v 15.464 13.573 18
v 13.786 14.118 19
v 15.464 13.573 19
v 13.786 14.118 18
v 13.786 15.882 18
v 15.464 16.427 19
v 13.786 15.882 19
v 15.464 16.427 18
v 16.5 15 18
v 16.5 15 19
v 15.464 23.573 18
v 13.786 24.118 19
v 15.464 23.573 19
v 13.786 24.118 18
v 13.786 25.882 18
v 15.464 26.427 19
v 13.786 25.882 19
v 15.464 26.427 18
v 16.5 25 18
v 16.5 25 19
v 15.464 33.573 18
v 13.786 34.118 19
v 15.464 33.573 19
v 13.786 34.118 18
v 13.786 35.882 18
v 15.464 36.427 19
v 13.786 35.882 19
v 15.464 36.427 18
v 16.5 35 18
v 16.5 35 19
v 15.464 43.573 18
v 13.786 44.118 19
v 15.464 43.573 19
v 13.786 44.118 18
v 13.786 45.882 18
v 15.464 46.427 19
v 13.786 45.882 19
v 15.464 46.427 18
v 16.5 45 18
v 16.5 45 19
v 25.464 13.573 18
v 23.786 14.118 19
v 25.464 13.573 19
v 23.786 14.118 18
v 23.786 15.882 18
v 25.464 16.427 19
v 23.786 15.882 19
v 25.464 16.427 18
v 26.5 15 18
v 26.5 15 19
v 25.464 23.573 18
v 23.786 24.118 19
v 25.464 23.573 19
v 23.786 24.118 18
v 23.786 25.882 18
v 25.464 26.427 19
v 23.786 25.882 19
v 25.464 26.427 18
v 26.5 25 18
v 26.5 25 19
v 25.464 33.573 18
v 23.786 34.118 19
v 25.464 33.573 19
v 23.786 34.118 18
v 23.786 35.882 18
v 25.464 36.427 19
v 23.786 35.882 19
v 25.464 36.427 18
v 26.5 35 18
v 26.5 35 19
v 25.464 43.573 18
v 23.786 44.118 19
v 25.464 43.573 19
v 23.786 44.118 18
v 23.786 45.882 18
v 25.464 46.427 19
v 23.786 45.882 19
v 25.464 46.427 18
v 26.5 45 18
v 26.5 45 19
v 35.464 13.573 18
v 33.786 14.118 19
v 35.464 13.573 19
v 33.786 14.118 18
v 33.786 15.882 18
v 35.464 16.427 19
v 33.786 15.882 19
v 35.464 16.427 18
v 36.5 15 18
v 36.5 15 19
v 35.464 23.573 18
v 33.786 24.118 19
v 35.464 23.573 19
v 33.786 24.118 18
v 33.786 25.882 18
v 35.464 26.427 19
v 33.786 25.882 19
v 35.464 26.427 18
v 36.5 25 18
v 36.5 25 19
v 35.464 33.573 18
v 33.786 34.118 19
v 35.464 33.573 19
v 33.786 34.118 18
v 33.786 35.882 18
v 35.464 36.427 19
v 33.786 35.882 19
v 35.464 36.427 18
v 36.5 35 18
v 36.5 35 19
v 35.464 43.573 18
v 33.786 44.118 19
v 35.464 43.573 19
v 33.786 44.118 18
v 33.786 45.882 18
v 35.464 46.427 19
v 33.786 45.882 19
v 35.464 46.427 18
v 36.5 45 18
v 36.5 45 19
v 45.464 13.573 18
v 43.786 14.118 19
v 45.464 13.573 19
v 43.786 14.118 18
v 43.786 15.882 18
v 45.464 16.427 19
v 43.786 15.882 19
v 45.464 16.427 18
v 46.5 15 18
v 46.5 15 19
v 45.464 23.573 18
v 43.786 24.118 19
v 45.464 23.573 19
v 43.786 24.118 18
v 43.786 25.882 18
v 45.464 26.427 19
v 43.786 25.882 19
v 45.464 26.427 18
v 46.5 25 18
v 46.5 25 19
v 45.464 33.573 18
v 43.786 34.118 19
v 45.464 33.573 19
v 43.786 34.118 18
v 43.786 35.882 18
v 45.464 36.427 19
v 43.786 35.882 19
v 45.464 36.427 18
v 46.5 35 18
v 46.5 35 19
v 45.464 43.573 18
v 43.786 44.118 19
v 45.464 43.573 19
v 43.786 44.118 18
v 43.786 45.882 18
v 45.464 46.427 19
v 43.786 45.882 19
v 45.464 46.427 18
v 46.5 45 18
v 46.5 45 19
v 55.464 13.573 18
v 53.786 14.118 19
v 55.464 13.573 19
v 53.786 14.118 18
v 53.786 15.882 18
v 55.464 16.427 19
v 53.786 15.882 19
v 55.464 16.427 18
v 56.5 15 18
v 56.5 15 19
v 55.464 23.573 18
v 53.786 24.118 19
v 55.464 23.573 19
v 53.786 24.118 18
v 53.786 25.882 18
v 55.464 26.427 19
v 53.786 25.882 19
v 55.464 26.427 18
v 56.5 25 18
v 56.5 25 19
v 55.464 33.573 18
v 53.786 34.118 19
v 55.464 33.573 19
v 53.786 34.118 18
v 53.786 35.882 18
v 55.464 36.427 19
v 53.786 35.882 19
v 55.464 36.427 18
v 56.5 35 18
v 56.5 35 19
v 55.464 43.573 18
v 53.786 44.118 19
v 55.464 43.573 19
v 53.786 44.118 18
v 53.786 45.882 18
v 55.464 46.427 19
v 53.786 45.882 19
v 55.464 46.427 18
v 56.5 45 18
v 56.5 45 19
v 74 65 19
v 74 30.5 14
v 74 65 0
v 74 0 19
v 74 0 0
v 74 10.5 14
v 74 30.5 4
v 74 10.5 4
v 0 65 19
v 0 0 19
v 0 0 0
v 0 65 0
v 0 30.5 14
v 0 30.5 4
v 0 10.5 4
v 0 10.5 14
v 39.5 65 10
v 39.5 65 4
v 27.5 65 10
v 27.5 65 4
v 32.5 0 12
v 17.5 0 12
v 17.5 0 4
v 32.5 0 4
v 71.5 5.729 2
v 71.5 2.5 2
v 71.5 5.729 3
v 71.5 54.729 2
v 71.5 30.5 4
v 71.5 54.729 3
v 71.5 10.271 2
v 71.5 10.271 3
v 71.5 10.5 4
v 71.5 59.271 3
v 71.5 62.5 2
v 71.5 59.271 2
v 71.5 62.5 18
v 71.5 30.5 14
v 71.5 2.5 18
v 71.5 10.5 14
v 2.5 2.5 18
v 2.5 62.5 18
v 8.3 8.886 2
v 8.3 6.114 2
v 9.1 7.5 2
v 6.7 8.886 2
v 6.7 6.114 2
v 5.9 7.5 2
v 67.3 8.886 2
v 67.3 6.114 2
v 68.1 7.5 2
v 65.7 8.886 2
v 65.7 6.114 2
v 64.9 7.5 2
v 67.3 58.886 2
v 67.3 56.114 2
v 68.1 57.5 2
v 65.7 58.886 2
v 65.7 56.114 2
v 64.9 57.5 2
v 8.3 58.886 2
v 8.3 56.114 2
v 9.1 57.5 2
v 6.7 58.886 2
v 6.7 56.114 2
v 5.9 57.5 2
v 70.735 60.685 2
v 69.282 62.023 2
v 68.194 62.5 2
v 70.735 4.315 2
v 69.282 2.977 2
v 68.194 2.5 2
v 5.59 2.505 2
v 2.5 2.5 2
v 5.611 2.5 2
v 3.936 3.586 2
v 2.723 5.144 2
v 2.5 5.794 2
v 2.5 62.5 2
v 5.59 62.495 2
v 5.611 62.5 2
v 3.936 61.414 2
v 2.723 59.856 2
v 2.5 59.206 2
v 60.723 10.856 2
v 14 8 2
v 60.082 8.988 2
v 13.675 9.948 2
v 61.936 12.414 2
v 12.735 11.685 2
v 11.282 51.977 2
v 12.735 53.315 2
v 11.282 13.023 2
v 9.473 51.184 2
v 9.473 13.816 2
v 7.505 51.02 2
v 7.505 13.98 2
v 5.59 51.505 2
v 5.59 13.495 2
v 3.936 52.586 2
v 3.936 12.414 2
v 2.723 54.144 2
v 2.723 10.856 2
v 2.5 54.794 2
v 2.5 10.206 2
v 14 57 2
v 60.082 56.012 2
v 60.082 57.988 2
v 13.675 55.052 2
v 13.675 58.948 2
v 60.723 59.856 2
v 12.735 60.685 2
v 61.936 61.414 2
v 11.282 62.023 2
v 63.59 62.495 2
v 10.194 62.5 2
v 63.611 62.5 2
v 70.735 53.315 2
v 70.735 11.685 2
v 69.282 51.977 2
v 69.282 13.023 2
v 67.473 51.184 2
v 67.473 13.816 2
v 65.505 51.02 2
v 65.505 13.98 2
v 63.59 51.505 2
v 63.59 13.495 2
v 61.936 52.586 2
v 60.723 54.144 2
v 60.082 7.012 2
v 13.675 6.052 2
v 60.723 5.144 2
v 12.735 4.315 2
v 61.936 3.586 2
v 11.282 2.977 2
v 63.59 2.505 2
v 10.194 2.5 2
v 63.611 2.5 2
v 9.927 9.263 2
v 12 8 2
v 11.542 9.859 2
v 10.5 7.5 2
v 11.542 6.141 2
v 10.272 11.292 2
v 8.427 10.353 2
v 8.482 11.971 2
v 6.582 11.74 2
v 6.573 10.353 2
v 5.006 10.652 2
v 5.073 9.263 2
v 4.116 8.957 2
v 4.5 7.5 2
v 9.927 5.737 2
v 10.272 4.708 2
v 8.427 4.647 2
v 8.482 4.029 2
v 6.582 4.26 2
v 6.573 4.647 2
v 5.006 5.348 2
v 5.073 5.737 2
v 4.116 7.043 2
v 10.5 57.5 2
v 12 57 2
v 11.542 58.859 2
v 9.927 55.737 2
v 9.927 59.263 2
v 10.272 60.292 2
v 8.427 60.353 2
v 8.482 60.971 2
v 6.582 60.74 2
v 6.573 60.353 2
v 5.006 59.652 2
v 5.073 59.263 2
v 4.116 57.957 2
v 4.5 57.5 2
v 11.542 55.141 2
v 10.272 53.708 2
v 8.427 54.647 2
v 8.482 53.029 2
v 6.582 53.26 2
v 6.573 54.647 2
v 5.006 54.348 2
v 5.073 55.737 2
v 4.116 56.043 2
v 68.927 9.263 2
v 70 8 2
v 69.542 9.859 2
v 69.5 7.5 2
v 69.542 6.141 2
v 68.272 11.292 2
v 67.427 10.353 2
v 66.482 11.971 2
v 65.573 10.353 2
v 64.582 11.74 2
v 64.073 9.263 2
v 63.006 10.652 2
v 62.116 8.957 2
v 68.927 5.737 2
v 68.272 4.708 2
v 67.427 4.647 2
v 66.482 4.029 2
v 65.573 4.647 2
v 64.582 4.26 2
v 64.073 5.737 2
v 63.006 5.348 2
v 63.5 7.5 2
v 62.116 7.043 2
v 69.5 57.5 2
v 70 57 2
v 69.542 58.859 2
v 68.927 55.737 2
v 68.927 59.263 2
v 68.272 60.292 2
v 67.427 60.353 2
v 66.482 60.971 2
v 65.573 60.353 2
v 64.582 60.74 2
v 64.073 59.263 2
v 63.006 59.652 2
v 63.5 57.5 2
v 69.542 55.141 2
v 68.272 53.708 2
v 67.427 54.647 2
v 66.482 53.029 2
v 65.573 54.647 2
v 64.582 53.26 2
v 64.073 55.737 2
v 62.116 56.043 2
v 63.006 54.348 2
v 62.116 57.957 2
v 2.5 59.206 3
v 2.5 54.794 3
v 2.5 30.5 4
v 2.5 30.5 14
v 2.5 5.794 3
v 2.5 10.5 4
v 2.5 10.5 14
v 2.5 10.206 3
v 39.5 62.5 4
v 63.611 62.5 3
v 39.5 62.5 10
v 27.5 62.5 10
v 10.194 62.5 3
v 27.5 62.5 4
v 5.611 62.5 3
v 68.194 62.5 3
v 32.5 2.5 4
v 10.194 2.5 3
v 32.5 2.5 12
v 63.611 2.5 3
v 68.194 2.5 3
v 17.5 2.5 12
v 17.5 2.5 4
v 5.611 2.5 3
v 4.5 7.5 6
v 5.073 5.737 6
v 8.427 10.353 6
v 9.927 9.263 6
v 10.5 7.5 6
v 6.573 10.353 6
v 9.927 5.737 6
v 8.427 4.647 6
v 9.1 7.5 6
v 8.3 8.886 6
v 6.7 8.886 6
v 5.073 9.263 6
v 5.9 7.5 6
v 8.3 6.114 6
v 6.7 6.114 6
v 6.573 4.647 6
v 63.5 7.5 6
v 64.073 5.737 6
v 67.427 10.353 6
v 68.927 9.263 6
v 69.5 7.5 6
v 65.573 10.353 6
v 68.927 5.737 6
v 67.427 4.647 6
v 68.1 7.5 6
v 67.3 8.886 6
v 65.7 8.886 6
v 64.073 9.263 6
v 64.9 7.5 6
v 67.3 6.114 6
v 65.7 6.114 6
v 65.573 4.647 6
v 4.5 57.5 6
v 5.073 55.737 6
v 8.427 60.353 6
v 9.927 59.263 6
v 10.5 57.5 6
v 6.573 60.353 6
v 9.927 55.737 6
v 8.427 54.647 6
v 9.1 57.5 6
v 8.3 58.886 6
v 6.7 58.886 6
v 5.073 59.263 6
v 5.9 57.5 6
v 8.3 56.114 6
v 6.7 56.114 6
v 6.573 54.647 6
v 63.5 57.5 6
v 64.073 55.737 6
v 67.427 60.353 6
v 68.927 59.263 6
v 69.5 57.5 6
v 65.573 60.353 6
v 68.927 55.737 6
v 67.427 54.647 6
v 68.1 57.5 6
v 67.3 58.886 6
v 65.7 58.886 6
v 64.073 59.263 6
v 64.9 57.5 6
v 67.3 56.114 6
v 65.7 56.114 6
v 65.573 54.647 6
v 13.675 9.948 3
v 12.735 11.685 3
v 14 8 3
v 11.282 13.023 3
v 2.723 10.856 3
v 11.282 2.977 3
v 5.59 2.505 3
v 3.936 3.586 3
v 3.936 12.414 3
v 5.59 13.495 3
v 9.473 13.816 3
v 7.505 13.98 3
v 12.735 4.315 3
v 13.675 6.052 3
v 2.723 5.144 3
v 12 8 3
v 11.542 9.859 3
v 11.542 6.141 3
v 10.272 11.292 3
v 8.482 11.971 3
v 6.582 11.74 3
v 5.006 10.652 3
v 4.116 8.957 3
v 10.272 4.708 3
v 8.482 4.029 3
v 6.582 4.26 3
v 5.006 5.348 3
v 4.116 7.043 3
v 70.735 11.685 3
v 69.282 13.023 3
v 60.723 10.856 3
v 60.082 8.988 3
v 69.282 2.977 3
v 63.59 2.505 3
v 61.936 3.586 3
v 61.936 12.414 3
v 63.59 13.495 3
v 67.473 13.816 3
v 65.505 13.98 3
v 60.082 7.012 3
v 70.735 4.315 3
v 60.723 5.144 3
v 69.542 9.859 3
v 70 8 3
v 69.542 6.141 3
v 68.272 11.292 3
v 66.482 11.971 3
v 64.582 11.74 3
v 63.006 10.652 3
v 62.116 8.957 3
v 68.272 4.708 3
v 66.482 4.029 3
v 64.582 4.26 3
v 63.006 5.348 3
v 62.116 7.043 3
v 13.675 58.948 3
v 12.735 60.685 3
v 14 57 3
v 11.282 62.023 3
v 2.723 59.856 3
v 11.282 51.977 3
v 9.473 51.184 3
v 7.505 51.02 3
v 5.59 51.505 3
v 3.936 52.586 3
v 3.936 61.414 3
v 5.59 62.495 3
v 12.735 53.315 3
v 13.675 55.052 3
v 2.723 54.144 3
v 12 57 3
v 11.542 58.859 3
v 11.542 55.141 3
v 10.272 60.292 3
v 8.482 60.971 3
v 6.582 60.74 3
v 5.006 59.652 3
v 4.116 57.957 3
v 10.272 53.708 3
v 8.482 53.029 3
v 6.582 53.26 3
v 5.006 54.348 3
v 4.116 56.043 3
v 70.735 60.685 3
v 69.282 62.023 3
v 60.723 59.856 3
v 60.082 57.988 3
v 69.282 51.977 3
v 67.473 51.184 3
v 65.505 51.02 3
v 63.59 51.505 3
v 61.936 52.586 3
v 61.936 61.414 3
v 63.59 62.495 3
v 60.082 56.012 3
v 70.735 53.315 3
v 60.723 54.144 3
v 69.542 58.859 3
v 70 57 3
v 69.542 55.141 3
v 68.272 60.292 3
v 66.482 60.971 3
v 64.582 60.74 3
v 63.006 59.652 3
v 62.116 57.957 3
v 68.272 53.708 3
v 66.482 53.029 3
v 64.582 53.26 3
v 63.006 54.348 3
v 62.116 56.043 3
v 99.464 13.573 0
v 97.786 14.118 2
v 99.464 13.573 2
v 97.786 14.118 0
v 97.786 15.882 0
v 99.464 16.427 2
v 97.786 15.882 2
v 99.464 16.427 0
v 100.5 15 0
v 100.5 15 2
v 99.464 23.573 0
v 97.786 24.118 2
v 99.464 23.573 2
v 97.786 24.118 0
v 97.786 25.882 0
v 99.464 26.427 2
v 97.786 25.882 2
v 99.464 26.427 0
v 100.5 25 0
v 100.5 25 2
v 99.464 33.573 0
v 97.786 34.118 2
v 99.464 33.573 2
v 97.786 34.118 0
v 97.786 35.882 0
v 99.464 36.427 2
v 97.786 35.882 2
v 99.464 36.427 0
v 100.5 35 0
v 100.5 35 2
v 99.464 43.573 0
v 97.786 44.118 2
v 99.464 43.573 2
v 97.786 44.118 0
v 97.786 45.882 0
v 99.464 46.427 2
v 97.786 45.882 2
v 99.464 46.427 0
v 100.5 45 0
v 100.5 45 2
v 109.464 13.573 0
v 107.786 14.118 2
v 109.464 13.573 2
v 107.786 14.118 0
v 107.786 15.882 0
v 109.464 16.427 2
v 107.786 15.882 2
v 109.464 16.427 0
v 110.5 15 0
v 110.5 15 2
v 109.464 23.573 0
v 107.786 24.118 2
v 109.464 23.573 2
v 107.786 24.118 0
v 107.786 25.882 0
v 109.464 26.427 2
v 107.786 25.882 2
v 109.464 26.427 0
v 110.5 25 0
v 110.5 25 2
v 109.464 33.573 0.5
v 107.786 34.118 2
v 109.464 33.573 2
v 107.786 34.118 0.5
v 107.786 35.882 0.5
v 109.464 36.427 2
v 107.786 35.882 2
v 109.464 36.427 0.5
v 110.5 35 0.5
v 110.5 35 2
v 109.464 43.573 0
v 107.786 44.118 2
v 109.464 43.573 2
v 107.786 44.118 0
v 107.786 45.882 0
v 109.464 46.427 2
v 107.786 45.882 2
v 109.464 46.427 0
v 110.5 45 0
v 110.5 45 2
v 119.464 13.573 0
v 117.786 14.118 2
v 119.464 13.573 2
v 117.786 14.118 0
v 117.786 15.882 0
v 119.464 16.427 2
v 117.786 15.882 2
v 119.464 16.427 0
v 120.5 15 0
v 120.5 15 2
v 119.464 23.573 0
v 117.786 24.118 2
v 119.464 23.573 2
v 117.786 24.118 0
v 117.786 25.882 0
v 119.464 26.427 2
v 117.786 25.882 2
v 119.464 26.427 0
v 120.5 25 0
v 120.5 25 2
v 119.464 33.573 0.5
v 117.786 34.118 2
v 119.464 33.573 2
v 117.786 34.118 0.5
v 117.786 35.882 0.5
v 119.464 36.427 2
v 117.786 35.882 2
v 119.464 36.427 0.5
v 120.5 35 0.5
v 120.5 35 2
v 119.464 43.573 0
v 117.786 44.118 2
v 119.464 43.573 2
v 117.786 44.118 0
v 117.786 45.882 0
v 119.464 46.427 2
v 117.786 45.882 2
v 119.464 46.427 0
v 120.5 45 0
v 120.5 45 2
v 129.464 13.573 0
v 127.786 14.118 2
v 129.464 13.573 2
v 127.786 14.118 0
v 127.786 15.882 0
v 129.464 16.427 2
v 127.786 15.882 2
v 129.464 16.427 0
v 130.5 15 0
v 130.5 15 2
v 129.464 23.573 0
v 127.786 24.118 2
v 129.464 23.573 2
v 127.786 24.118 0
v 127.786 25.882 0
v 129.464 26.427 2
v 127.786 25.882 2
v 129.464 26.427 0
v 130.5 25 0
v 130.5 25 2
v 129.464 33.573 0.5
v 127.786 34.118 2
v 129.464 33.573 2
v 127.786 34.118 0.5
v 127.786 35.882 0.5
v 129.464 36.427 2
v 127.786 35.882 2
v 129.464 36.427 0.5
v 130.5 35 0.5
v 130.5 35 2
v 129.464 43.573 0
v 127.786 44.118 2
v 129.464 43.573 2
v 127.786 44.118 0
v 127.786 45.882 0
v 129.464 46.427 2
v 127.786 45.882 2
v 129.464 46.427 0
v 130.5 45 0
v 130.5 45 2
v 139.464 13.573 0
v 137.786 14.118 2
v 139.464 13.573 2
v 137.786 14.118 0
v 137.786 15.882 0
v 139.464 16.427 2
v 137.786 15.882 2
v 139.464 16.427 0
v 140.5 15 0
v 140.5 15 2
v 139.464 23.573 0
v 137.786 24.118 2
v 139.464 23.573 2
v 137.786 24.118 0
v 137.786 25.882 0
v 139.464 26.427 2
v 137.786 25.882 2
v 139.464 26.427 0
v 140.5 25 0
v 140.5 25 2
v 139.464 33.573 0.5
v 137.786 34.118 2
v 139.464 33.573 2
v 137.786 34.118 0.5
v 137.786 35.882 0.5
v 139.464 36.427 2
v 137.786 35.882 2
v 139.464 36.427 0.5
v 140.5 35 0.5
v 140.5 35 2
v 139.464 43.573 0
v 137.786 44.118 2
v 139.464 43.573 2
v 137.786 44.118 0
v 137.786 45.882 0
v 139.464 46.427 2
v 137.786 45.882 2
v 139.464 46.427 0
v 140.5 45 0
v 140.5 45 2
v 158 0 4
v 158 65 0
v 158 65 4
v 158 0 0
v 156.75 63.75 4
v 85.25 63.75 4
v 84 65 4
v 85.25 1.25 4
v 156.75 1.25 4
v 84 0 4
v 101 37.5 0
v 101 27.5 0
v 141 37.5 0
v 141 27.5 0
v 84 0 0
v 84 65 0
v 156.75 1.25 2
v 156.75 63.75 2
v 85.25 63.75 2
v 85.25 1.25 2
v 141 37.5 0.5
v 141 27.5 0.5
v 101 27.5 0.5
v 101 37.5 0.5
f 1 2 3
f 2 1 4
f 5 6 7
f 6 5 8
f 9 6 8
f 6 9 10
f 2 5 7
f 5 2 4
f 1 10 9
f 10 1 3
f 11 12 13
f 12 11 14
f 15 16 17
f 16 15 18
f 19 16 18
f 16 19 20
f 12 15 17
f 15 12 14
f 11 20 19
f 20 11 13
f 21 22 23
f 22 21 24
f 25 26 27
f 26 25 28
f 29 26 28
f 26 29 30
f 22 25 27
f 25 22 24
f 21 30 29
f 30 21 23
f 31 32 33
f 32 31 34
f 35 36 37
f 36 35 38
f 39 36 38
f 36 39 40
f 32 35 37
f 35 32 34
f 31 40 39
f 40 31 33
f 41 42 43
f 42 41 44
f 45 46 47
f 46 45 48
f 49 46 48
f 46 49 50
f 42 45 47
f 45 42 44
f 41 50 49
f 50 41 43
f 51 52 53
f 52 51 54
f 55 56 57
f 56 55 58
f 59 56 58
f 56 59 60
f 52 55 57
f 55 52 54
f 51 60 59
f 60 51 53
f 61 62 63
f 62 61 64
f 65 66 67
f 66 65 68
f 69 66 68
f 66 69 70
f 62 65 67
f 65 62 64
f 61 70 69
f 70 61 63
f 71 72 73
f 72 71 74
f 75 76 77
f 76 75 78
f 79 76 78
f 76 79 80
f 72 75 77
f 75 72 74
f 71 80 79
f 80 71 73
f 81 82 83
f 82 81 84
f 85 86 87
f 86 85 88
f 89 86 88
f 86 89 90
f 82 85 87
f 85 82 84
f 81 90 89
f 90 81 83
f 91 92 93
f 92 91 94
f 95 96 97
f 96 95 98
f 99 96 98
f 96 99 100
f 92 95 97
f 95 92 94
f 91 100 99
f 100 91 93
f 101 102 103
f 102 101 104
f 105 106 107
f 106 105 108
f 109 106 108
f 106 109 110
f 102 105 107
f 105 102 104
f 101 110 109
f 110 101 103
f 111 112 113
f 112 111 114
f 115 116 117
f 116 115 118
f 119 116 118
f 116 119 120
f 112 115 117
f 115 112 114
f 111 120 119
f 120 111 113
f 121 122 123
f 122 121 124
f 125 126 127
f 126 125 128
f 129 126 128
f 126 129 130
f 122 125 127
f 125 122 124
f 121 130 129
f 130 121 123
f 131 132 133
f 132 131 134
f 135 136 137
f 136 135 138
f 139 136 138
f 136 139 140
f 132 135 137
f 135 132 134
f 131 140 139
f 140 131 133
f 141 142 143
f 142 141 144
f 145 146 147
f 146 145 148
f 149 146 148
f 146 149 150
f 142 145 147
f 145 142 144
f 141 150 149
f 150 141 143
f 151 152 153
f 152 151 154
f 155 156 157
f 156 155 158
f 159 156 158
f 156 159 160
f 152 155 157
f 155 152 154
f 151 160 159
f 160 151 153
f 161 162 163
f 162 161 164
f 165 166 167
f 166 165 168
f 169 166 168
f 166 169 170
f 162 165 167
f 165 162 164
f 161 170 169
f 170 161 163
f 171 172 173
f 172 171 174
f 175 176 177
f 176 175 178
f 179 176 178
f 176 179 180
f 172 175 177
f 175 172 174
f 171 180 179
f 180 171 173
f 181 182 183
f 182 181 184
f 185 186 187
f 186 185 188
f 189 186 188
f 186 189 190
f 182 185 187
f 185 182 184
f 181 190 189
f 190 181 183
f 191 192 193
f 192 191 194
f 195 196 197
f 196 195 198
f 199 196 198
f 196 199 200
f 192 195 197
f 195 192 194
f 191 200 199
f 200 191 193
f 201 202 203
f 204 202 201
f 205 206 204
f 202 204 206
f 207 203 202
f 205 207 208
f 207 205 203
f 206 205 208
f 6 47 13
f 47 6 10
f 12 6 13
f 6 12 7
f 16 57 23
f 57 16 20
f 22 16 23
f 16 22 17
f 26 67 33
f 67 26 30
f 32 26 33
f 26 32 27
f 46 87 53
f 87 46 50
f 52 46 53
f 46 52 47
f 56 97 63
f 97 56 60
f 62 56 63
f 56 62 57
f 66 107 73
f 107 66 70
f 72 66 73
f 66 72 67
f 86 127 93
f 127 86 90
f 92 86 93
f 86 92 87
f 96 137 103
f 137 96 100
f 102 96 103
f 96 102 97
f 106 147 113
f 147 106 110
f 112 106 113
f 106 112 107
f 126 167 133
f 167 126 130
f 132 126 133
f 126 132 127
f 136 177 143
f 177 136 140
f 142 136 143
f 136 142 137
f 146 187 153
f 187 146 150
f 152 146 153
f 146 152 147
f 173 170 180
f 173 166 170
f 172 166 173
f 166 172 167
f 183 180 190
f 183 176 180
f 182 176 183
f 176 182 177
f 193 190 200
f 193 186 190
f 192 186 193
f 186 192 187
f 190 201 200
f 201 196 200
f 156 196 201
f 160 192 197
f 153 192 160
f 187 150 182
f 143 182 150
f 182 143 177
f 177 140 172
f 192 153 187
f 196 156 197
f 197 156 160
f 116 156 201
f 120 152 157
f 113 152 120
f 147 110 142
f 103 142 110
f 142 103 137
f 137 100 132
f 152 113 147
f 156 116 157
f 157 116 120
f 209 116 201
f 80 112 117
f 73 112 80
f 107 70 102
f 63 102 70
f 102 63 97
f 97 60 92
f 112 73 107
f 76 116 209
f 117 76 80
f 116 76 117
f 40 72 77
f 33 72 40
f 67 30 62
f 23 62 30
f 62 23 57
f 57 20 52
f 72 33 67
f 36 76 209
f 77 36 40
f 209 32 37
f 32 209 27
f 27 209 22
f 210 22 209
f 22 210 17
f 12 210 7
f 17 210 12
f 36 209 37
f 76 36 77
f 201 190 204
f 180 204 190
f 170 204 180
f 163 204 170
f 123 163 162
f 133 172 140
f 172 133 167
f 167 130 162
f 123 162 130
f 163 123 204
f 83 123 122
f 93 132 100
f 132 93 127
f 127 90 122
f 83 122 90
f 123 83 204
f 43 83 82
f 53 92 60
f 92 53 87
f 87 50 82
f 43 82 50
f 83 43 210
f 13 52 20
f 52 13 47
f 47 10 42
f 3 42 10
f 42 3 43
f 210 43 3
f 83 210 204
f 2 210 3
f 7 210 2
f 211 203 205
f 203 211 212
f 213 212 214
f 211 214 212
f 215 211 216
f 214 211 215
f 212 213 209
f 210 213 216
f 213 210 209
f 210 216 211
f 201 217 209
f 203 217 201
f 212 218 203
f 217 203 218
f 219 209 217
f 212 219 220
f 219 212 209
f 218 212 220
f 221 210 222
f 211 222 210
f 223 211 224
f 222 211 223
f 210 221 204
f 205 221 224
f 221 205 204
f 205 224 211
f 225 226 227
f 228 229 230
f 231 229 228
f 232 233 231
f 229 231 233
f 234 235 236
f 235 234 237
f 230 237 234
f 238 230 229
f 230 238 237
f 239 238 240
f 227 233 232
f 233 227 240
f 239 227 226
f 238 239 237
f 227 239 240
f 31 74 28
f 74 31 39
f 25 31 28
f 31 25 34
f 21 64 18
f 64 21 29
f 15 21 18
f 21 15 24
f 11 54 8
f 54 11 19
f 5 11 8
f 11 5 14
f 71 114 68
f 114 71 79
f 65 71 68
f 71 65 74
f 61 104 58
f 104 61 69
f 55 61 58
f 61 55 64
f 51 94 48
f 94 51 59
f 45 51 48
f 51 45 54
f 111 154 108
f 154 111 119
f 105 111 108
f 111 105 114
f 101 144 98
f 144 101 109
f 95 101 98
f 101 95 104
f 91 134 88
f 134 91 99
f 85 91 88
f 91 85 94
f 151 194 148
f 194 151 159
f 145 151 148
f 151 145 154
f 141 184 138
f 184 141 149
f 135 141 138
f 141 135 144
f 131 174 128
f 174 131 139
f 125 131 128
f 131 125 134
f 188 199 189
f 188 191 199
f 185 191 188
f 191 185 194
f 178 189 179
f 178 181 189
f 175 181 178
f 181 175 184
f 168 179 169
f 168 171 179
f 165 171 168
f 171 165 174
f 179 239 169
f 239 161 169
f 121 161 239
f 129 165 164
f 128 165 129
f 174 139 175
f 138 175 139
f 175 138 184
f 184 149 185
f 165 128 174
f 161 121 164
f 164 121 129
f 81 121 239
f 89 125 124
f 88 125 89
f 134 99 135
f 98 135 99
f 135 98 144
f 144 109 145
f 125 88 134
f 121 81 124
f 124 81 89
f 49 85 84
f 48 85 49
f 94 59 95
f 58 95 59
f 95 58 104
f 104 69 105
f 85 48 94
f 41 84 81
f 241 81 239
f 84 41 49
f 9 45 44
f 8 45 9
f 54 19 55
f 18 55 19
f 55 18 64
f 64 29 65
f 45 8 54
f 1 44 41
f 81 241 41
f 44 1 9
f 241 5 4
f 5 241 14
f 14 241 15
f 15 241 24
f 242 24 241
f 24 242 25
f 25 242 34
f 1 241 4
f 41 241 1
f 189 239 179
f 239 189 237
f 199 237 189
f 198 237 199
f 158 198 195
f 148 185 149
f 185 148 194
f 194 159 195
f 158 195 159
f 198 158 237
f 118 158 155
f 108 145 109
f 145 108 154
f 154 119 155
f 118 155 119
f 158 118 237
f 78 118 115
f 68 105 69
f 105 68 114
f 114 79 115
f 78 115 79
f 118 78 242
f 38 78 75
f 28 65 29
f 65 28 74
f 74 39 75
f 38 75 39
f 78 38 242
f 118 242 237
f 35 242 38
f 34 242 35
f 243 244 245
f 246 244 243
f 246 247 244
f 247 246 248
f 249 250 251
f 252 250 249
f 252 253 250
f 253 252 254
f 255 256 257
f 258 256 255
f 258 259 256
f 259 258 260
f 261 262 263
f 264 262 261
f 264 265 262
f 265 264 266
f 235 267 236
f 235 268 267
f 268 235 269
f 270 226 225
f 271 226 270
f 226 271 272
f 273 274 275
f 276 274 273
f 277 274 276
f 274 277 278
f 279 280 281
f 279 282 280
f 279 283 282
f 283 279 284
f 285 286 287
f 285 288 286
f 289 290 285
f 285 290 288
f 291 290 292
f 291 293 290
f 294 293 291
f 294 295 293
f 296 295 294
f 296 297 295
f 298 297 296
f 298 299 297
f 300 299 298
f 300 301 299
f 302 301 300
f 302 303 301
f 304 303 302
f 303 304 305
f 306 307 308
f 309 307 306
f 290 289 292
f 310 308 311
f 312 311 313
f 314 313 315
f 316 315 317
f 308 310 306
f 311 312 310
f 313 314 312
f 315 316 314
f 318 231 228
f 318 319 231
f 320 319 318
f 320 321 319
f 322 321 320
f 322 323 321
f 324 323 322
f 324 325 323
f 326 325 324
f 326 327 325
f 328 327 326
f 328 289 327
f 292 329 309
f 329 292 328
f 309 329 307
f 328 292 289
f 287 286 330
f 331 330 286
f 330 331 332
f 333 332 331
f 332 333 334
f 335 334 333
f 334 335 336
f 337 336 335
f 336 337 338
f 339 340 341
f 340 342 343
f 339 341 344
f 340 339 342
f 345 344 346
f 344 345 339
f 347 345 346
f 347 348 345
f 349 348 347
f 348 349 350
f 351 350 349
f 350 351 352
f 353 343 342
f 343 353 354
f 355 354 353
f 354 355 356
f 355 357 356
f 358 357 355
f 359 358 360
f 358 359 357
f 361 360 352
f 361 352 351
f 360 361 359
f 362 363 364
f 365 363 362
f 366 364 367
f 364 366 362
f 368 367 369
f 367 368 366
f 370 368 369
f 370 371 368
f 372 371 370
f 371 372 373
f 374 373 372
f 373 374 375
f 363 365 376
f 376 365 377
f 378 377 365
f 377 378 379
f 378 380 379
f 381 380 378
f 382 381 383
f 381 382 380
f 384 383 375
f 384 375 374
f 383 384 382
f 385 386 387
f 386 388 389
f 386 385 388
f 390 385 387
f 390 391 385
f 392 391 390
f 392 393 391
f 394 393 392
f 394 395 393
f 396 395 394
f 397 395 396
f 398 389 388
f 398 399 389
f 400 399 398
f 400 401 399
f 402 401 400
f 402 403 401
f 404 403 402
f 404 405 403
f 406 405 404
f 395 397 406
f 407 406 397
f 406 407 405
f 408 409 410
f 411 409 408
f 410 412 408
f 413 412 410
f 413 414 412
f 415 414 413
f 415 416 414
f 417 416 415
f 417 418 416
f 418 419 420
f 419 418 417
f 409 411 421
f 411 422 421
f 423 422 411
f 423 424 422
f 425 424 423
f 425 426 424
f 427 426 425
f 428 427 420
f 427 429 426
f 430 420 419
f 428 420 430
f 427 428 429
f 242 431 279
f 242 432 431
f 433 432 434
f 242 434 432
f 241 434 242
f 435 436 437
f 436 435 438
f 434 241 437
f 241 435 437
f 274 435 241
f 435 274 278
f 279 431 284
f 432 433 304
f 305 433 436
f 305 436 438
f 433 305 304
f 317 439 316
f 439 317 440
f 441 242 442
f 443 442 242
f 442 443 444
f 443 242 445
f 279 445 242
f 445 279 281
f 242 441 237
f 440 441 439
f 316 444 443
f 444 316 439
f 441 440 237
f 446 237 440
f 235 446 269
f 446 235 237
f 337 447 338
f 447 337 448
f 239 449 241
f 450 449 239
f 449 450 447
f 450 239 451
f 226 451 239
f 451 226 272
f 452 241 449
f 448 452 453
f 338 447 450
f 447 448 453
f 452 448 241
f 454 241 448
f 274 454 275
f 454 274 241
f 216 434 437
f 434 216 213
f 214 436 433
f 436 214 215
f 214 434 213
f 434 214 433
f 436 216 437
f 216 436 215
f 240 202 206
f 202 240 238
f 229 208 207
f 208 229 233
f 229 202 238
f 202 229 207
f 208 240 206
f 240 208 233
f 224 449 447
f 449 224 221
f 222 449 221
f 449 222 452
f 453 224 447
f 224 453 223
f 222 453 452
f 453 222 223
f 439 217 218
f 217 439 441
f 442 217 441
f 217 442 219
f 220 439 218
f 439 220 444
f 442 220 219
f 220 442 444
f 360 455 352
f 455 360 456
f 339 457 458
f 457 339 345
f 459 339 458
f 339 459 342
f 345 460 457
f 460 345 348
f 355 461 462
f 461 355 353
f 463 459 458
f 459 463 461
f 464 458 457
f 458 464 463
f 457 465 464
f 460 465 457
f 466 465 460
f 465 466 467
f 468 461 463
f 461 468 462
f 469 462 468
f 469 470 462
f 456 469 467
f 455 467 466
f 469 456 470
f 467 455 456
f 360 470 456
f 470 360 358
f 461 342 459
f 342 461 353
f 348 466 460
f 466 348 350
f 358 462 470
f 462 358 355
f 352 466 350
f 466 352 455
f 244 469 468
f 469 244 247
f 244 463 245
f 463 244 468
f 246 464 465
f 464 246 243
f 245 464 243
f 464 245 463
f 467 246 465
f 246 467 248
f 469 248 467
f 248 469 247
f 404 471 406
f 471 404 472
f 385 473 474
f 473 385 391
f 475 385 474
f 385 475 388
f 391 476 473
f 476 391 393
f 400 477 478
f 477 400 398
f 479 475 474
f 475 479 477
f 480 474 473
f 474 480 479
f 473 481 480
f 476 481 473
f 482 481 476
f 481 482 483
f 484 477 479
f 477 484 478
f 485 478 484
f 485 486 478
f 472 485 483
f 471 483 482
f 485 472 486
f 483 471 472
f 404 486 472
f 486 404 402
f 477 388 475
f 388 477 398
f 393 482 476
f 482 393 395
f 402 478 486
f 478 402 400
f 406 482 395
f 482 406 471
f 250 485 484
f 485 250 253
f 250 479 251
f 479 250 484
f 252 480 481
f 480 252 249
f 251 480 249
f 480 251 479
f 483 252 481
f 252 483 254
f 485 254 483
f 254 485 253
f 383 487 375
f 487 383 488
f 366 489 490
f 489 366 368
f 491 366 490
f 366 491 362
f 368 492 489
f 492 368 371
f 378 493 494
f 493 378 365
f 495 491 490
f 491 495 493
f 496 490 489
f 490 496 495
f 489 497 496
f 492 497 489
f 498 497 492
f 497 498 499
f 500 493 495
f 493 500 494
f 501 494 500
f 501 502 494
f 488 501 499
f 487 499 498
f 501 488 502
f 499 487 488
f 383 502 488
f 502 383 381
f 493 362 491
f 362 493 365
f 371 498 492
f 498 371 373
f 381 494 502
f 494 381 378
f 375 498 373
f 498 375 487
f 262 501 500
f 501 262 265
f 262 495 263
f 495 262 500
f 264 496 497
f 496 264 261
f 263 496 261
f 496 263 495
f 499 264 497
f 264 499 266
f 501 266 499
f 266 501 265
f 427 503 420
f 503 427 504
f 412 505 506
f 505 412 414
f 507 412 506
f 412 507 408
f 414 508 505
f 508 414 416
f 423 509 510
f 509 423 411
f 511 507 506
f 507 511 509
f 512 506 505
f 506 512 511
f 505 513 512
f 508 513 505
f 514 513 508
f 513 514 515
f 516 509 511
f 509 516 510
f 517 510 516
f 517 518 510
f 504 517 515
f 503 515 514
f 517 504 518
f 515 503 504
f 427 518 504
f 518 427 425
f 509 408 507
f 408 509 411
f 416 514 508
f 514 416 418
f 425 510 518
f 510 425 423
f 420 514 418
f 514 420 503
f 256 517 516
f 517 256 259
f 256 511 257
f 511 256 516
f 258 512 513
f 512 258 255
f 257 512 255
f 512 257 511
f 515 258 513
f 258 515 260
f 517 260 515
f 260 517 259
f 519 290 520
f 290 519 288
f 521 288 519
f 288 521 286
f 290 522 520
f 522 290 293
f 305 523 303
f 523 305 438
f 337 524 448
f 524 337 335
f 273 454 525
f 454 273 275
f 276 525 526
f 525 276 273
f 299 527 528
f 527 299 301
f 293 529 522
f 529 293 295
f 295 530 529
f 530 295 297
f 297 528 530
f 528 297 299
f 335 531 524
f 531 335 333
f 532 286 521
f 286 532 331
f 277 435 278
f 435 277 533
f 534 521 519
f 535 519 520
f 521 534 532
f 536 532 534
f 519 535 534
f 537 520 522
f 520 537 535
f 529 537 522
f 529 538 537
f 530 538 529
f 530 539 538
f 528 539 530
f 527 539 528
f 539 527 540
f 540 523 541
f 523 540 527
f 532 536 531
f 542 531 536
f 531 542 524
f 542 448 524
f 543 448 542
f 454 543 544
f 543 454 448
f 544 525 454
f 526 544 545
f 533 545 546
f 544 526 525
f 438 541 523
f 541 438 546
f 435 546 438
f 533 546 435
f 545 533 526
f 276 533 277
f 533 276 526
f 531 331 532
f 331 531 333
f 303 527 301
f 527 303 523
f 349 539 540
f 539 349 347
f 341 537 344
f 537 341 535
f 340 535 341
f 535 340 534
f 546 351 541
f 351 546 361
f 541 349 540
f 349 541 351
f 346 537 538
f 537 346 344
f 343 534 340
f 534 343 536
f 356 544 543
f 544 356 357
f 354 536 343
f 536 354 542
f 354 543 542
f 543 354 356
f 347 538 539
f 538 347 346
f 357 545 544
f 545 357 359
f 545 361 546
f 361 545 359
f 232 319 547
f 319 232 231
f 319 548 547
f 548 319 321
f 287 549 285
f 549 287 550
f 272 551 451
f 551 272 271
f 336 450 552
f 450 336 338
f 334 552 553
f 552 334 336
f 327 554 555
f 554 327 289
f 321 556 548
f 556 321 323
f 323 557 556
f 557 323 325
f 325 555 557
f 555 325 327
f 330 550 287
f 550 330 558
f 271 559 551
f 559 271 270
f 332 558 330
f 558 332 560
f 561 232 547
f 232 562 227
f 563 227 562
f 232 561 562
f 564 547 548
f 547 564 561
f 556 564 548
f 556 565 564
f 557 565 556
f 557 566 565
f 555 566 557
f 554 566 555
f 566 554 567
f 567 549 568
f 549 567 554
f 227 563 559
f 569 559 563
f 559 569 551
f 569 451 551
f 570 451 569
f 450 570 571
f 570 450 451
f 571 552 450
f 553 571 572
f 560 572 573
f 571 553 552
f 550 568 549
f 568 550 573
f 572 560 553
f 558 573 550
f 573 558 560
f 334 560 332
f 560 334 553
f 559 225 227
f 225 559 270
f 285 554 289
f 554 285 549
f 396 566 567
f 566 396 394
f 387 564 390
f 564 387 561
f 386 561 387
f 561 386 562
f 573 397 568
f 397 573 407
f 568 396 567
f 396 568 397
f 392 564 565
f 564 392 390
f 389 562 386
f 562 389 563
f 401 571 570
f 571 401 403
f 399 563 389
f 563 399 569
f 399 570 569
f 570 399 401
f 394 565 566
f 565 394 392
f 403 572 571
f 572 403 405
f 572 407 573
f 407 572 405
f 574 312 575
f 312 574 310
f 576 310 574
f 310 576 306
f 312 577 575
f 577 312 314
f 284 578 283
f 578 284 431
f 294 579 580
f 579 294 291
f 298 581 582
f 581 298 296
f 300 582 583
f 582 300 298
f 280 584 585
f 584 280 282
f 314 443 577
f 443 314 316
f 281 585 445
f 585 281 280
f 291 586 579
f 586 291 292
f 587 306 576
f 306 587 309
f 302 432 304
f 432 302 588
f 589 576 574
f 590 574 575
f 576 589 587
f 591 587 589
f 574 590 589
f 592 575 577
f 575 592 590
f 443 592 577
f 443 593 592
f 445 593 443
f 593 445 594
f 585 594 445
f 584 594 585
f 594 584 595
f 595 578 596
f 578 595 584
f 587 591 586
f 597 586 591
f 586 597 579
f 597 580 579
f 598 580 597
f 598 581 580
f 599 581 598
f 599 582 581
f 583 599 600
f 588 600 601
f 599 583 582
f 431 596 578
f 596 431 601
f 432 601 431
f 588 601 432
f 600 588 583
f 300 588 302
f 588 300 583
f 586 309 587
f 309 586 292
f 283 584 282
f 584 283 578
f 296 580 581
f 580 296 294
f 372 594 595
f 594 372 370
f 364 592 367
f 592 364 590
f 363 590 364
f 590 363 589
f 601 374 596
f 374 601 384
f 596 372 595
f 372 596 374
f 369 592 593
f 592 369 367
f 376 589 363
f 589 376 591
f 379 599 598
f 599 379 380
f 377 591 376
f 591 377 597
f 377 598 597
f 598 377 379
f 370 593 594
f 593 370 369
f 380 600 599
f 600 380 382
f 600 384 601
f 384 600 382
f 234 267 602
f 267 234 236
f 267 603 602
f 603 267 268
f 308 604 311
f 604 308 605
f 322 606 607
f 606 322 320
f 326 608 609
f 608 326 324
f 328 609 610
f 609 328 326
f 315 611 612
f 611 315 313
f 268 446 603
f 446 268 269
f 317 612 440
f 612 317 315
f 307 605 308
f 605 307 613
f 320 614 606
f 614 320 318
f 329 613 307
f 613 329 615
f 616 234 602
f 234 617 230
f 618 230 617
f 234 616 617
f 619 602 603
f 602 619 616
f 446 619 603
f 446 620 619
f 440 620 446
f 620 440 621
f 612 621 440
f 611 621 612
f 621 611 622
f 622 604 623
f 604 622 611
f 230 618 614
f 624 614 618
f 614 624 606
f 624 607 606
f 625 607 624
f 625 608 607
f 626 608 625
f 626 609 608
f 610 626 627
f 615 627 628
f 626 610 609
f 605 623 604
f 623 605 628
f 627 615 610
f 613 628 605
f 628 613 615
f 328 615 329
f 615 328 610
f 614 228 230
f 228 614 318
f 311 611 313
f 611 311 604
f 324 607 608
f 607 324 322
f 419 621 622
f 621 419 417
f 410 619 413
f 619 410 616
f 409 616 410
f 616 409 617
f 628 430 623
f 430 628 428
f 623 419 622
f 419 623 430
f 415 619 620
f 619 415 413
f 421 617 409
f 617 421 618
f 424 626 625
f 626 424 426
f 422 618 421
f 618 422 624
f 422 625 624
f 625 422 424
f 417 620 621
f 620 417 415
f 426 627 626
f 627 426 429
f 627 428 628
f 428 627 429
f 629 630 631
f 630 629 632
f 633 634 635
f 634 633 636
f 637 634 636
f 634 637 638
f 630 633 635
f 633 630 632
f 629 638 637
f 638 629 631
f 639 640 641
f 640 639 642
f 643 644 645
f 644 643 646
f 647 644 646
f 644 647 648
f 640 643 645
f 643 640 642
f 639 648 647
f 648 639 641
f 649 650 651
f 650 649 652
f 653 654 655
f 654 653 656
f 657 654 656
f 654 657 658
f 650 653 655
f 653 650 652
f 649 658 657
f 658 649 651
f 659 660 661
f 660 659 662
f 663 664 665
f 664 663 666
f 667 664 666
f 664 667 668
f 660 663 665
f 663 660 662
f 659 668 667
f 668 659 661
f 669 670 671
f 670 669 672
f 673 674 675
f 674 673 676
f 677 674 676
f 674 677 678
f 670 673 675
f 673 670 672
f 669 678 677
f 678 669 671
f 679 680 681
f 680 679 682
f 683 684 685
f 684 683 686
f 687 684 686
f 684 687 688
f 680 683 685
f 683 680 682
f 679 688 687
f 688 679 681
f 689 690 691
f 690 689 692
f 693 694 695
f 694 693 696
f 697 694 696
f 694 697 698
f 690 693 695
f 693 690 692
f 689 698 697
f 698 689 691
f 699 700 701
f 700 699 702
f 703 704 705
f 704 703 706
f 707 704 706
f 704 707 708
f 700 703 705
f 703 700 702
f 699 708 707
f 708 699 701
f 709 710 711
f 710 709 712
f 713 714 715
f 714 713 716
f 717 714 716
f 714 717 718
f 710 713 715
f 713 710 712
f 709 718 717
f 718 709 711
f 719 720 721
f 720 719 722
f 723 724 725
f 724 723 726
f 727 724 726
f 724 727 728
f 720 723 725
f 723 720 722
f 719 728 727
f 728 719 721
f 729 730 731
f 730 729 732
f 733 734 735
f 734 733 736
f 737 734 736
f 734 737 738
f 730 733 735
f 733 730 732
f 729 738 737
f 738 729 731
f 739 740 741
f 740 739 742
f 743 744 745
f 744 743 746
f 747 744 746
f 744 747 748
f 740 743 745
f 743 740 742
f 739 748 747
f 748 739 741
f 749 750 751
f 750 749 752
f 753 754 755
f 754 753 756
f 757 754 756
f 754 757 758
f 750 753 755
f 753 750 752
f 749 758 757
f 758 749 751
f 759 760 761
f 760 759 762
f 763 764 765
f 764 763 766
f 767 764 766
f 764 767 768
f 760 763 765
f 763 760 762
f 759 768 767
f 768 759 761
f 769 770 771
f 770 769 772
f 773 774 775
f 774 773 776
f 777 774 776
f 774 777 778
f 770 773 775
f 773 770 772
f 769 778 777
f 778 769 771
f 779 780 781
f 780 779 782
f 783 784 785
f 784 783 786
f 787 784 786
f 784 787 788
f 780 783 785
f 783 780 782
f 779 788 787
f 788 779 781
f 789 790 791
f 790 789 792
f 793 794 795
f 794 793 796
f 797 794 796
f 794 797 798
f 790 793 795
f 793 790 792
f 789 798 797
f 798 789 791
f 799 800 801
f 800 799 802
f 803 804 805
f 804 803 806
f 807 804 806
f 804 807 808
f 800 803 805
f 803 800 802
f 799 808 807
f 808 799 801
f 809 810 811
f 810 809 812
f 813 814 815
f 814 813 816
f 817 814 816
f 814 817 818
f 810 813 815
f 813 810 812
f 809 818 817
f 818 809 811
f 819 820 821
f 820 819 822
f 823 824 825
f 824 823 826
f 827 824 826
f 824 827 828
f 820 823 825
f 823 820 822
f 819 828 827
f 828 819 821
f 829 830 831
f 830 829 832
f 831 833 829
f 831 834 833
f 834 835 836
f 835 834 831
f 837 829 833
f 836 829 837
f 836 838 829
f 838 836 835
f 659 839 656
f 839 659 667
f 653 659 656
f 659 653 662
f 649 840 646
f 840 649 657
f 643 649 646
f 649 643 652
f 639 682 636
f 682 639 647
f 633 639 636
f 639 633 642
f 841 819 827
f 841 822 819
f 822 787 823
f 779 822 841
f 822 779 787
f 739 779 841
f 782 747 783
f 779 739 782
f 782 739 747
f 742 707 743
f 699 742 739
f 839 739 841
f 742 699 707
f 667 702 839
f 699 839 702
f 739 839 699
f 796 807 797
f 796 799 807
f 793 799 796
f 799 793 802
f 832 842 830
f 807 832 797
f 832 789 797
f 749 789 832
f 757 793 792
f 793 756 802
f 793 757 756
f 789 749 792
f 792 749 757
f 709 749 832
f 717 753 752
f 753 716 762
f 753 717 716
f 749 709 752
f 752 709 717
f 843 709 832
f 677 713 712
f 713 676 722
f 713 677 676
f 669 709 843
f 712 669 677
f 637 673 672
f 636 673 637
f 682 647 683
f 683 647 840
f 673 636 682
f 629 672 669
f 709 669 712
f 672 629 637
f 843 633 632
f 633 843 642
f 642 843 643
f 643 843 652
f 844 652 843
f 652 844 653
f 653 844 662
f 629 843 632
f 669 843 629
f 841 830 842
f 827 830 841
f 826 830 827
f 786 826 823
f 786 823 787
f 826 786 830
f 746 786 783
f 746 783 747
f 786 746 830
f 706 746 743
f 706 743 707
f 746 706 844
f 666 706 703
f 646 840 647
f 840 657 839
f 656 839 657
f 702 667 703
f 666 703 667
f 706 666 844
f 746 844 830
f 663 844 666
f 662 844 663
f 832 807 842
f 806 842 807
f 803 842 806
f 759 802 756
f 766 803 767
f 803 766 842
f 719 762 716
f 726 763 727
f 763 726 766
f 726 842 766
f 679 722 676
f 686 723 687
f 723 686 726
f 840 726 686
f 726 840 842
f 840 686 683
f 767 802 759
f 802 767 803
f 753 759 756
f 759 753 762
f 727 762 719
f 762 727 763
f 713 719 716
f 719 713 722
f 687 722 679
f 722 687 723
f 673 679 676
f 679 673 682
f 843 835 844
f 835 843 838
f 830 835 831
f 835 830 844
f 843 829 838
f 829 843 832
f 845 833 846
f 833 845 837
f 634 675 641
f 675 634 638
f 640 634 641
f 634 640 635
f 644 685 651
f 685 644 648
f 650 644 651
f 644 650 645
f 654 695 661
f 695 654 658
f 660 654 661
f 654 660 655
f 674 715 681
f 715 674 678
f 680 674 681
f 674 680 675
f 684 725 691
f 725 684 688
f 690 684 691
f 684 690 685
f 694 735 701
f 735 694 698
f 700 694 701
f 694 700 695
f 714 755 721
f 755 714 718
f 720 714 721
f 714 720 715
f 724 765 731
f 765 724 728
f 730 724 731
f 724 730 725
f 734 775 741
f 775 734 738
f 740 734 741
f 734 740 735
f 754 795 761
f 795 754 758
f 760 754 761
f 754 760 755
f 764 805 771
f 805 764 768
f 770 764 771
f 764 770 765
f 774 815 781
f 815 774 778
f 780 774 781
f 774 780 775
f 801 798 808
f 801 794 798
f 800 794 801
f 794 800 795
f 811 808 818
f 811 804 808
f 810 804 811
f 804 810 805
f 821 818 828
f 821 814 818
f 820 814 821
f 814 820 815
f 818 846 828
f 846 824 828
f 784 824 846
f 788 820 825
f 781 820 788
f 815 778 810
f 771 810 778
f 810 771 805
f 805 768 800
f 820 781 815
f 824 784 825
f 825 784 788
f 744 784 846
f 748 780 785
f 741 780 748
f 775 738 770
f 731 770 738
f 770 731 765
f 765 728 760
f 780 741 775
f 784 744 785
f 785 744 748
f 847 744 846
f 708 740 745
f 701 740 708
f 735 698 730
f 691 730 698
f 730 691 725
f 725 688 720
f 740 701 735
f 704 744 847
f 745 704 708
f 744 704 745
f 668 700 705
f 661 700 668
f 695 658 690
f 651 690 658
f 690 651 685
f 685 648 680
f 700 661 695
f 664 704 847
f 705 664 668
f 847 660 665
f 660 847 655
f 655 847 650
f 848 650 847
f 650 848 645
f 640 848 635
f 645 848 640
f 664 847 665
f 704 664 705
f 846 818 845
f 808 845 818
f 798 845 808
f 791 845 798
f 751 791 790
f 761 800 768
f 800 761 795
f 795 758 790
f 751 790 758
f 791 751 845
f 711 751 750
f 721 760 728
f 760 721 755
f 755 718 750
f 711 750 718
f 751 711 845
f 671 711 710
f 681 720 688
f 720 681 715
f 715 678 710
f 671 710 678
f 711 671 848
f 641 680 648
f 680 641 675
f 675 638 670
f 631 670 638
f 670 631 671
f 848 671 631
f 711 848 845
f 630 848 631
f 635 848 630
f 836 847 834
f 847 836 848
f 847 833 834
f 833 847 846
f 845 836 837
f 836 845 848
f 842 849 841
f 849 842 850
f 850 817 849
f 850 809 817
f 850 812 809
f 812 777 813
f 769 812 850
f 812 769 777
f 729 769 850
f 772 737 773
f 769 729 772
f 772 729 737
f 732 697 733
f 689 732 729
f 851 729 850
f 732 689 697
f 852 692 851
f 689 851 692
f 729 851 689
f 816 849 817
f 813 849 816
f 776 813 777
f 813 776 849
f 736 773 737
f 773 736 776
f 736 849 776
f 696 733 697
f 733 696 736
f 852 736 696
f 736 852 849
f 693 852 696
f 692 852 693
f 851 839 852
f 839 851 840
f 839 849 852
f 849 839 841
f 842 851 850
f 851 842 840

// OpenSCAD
// Motor Controller Case - 3D Printable
// Designed for dual H-bridge motor driver with 330µF capacitors
// Compatible with boards similar to L298N replacements

// Main dimensions (adjust based on your specific board)
board_length = 65;     // Board length in mm
board_width = 56;      // Board width in mm
board_thickness = 1.6; // PCB thickness in mm

// Case dimensions
case_wall = 2.5;       // Wall thickness
case_floor = 2;        // Bottom thickness
case_ceiling = 2;      // Top thickness
case_clearance = 3;    // Space above components

// Component heights (estimated)
capacitor_height = 12; // 330µF capacitor height
terminal_height = 8;   // Green terminal block height
chip_height = 4;       // IC height

// Calculate internal dimensions
internal_length = board_length + 4; // Small clearance around board
internal_width = board_width + 4;
internal_height = max(capacitor_height, terminal_height) + case_clearance;

// External case dimensions
external_length = internal_length + (case_wall * 2);
external_width = internal_width + (case_wall * 2);
external_height = internal_height + case_floor + case_ceiling;

// Mounting post dimensions
post_diameter = 6;
post_height = case_floor + 2;
screw_hole_diameter = 3.2; // M3 screw

// Terminal block cutout dimensions
terminal_width = 20;
terminal_depth = 12;

module main_case() {
    difference() {
        // Outer case
        cube([external_length, external_width, external_height]);
        
        // Internal cavity
        translate([case_wall, case_wall, case_floor]) {
            cube([internal_length, internal_width, internal_height + 1]);
        }
        
        // Terminal block cutouts (left side)
        translate([-1, case_wall + 8, case_floor + 2]) {
            cube([case_wall + 2, terminal_width, terminal_height + 2]);
        }
        
        // Terminal block cutouts (right side)
        translate([external_length - case_wall - 1, case_wall + 8, case_floor + 2]) {
            cube([case_wall + 2, terminal_width, terminal_height + 2]);
        }
        
        // Power input connector cutout (back)
        translate([case_wall + 15, -1, case_floor + 2]) {
            cube([15, case_wall + 2, 8]);
        }
        
        // Control signal connector cutout (front)
        translate([case_wall + 25, external_width - case_wall - 1, case_floor + 2]) {
            cube([12, case_wall + 2, 6]);
        }
        
        // Ventilation holes on top
        for(x = [15:10:external_length-15]) {
            for(y = [15:10:external_width-15]) {
                translate([x, y, external_height - case_ceiling]) {
                    cylinder(d=3, h=case_ceiling + 1);
                }
            }
        }
    }
    
    // Mounting posts for PCB
    translate([case_wall + 5, case_wall + 5, case_floor]) {
        mounting_post();
    }
    translate([case_wall + internal_length - 5, case_wall + 5, case_floor]) {
        mounting_post();
    }
    translate([case_wall + 5, case_wall + internal_width - 5, case_floor]) {
        mounting_post();
    }
    translate([case_wall + internal_length - 5, case_wall + internal_width - 5, case_floor]) {
        mounting_post();
    }
}

module mounting_post() {
    difference() {
        cylinder(d=post_diameter, h=post_height);
        cylinder(d=screw_hole_diameter, h=post_height + 1);
    }
}

module case_lid() {
    difference() {
        cube([external_length, external_width, case_ceiling + 2]);
        
        // Inner recess to fit on case
        translate([case_wall/2, case_wall/2, case_ceiling]) {
            cube([external_length - case_wall, external_width - case_wall, 3]);
        }
        
        // Ventilation holes
        for(x = [15:10:external_length-15]) {
            for(y = [15:10:external_width-15]) {
                translate([x, y, -1]) {
                    cylinder(d=3, h=case_ceiling + 4);
                }
            }
        }
        
        // Label recess
        translate([external_length/2 - 20, external_width/2 - 5, -0.5]) {
            cube([40, 10, 1]);
        }
    }
}

module case_bottom_with_feet() {
    union() {
        main_case();
        
        // Rubber feet positions
        translate([8, 8, 0]) {
            rubber_foot();
        }
        translate([external_length - 8, 8, 0]) {
            rubber_foot();
        }
        translate([8, external_width - 8, 0]) {
            rubber_foot();
        }
        translate([external_length - 8, external_width - 8, 0]) {
            rubber_foot();
        }
    }
}

module rubber_foot() {
    difference() {
        cylinder(d=12, h=3);
        translate([0, 0, 1]) {
            cylinder(d=8, h=3);
        }
    }
}

// Assembly view (comment out parts you don't want to print)
// Main case bottom
case_bottom_with_feet();

// Lid (translate for separate printing)
translate([external_length + 10, 0, 0]) {
    case_lid();
}

// Print settings information
echo("=== PRINT SETTINGS ===");
echo("Layer height: 0.2mm");
echo("Infill: 20%");
echo("Support: No support needed");
echo("Print orientation: As shown");
echo("");
echo("=== CASE DIMENSIONS ===");
echo(str("External: ", external_length, " x ", external_width, " x ", external_height, " mm"));
echo(str("Internal: ", internal_length, " x ", internal_width, " x ", internal_height, " mm"));
echo("");
echo("=== ASSEMBLY NOTES ===");
echo("1. Use M3 x 10mm screws for PCB mounting");
echo("2. Use M3 x 16mm screws for lid attachment (optional)");
echo("3. Consider adding rubber feet for desk protection");
